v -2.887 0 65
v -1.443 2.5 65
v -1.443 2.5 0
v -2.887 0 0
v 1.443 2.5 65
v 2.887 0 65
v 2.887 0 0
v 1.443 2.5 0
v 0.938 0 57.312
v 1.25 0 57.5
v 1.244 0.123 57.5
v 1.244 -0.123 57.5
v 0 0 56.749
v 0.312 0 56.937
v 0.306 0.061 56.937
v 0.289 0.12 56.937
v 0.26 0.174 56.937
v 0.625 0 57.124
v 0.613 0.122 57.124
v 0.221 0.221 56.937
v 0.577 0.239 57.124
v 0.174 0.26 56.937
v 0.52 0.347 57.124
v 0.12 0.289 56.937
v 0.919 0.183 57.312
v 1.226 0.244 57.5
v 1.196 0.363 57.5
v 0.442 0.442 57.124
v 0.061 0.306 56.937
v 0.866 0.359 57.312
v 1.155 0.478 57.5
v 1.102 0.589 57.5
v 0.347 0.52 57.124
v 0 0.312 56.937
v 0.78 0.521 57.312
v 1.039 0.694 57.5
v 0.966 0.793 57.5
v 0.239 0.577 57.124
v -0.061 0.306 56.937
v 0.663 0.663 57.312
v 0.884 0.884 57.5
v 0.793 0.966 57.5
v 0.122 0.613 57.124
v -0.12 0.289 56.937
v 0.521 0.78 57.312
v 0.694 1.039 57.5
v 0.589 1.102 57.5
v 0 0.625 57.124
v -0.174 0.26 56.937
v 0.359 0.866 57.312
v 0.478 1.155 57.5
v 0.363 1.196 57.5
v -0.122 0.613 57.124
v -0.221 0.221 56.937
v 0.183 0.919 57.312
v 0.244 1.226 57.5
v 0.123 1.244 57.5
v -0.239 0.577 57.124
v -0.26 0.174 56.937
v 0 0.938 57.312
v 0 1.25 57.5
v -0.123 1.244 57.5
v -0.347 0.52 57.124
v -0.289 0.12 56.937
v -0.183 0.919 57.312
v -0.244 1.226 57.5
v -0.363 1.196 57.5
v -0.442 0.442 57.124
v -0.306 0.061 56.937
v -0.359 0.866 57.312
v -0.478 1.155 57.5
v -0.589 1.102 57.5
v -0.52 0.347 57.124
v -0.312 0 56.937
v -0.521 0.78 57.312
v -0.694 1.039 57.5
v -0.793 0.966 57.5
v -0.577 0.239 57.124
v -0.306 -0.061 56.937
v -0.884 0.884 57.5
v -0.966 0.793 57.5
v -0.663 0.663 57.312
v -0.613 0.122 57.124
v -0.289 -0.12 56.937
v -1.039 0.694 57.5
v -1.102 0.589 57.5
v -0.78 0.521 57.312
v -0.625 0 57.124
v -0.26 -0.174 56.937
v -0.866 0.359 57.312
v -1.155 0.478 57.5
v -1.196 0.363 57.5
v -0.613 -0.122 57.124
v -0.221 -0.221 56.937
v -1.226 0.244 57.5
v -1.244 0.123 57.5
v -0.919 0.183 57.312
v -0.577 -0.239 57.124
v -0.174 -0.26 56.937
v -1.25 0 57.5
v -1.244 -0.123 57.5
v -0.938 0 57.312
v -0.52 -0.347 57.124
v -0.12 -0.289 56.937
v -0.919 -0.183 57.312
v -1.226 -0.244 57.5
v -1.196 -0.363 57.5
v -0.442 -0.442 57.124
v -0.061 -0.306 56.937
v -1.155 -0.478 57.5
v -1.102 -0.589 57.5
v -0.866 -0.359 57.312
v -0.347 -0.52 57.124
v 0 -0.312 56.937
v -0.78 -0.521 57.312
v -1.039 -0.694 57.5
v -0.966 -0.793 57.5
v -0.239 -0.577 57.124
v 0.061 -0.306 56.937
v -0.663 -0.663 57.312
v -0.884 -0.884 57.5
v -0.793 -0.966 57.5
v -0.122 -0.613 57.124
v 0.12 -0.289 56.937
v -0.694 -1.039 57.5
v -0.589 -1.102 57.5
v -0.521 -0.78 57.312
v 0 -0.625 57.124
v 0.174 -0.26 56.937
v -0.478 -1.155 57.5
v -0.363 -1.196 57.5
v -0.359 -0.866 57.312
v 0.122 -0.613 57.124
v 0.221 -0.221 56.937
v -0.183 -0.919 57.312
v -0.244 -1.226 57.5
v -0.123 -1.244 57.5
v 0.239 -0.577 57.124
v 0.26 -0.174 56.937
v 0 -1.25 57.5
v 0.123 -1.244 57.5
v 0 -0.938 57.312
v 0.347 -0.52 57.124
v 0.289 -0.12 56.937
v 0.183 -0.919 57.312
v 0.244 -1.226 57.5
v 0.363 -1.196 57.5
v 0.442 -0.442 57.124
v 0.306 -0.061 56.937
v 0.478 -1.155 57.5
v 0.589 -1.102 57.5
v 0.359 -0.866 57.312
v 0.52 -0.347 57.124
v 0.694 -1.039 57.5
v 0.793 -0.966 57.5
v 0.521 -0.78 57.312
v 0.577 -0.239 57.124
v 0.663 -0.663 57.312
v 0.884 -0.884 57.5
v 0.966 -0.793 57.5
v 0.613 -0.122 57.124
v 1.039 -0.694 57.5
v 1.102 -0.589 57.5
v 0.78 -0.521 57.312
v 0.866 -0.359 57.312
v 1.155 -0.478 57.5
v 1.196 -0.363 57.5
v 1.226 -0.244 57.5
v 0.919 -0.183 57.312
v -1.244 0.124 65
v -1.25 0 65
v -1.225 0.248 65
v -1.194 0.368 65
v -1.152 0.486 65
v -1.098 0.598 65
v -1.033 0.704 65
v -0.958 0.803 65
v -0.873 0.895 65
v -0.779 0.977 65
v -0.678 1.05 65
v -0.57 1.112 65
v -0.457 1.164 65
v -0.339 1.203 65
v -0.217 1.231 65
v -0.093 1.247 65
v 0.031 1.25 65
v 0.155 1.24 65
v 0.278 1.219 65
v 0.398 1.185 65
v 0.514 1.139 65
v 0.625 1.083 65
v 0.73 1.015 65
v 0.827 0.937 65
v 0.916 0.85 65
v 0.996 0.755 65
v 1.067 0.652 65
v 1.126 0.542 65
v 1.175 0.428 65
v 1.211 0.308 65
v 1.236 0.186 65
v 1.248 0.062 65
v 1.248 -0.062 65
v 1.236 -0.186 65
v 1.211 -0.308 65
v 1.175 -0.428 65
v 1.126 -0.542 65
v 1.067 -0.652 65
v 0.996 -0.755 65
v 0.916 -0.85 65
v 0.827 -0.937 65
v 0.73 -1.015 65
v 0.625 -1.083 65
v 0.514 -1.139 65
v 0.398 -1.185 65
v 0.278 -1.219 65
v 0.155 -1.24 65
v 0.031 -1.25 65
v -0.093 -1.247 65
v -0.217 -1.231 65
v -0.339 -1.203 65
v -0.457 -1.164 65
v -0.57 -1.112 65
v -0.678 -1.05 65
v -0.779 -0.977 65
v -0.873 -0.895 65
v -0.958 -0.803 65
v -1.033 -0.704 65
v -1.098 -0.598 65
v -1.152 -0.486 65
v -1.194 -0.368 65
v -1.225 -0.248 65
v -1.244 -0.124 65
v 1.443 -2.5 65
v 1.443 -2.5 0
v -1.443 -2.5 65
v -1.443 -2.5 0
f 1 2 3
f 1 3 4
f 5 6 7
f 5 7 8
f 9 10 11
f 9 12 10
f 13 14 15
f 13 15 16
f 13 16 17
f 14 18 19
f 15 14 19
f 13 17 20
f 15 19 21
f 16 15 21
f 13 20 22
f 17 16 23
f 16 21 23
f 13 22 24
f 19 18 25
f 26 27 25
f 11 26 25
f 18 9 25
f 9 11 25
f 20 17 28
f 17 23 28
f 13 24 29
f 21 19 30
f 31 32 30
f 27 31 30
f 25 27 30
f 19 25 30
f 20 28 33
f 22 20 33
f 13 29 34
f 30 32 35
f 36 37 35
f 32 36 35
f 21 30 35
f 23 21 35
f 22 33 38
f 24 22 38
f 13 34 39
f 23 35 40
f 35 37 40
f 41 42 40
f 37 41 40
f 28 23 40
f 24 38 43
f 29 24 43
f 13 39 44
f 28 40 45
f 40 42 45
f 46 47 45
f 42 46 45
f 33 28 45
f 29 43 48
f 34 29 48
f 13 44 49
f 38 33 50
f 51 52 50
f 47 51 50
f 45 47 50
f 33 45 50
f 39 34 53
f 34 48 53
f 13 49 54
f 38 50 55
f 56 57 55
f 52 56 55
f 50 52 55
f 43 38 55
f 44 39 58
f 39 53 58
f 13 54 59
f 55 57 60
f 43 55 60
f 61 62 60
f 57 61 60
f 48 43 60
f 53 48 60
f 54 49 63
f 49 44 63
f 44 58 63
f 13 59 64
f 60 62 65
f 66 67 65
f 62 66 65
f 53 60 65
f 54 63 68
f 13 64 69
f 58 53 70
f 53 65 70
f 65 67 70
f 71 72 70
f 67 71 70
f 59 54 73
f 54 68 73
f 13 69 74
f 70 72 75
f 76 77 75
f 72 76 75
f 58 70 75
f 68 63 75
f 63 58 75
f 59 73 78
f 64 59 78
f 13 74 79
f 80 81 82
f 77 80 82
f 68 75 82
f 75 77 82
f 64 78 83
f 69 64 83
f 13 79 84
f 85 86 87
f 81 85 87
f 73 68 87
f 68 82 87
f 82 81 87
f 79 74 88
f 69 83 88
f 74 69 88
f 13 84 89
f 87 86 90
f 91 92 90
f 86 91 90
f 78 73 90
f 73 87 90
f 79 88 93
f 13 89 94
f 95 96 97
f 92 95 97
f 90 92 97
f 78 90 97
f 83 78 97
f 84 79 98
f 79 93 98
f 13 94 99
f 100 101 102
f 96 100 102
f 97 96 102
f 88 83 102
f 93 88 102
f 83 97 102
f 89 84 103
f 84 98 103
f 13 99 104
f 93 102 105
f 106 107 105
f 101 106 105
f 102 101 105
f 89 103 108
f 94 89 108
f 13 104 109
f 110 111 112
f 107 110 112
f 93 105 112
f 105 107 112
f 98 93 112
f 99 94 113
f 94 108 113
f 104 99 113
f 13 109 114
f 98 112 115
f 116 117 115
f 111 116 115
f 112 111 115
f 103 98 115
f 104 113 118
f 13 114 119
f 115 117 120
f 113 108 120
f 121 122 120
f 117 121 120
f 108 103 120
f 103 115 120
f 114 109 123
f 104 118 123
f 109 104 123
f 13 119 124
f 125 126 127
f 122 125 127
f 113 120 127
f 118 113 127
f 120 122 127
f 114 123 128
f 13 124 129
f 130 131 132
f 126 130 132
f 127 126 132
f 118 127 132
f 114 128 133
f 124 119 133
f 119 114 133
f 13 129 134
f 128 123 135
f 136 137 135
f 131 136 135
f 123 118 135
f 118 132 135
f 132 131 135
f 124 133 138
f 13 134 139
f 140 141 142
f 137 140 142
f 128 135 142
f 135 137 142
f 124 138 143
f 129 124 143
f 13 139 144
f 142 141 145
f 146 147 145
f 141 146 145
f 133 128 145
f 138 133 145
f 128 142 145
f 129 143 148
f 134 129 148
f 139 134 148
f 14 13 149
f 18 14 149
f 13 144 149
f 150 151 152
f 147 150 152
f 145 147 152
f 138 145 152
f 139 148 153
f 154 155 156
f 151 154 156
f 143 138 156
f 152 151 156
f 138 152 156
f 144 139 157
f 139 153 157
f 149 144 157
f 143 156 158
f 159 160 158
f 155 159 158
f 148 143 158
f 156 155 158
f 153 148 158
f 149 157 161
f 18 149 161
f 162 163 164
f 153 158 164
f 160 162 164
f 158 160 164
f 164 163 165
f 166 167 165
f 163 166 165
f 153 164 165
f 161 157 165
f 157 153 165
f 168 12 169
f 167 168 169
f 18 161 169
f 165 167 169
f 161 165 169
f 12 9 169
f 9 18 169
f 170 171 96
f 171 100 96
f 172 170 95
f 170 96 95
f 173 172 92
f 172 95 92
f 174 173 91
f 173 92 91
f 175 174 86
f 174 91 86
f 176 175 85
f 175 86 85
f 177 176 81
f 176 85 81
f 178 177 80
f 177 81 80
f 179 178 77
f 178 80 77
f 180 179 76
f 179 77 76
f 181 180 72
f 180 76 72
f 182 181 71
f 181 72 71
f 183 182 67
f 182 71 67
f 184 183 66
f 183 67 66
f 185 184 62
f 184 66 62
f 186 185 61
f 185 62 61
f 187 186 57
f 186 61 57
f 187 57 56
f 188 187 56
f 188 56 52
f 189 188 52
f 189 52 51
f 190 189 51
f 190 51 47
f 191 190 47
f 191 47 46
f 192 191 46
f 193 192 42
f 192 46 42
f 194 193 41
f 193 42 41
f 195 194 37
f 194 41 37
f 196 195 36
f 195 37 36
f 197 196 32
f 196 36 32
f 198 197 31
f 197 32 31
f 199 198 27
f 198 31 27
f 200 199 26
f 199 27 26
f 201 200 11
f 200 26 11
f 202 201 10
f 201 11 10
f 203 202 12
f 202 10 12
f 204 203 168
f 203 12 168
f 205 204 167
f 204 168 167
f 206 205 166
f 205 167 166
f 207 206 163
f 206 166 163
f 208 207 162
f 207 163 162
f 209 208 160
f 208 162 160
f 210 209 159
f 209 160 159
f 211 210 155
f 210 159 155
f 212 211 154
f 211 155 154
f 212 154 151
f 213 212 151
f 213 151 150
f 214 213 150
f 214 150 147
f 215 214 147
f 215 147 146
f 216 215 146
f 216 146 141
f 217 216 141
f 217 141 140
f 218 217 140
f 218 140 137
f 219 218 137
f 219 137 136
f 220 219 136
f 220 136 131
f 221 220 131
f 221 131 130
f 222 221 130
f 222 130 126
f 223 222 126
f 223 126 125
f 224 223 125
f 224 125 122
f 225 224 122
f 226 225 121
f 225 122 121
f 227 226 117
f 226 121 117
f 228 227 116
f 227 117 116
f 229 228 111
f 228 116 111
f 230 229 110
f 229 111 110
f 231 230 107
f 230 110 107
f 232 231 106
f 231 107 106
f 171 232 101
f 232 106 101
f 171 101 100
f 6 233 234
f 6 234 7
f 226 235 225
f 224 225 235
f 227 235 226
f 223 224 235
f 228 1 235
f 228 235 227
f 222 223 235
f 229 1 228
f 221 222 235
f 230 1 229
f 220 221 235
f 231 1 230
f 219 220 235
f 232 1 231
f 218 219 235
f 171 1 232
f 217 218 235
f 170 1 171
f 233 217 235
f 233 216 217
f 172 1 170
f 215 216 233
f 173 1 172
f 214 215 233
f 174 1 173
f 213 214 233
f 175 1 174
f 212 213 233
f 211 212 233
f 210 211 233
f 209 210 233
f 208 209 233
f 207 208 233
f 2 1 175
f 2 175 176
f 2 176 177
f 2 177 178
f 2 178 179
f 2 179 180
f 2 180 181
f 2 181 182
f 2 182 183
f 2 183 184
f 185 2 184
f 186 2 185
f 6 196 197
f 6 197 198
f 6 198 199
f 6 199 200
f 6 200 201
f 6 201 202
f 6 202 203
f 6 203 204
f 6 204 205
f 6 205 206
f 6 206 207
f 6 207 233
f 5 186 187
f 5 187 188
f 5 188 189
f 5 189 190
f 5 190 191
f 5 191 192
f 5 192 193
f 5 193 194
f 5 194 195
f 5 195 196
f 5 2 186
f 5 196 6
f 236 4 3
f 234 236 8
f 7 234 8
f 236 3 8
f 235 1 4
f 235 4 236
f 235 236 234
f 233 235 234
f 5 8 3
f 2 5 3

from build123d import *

# Parameters (mm, degrees)
SKETCH_1_R             = 1.5
EXTRUDE_1_DEPTH        = 65
HOLE_WIZARD_M3_1_D     = 2.5
HOLE_WIZARD_M3_1_DEPTH = 7.5
HOLE_WIZARD_M3_1_TIP   = 0.751075774


with BuildPart() as part:
    # 草图1 → 凸台-拉伸1 (new body)
    # profile 1 of 2: a face of its own
    with BuildSketch(Plane.XY):
        Polygon((-1.443375673, -2.5), (1.443375673, -2.5), (2.886751346, 0), (1.443375673, 2.5), (-1.443375673, 2.5), (-2.886751346, 0), align=None)
        Circle(SKETCH_1_R, mode=Mode.SUBTRACT)
    # profile 2 of 2: a face of its own
    with BuildSketch(Plane.XY):
        Circle(SKETCH_1_R)
    extrude(amount=EXTRUDE_1_DEPTH)

    # M3 螺纹孔1
    with Locations(Plane.XY.offset(65)):
        with Locations((0, 0)):
            Hole(HOLE_WIZARD_M3_1_D / 2, depth=HOLE_WIZARD_M3_1_DEPTH)
            with Locations((0, 0, -(HOLE_WIZARD_M3_1_DEPTH + HOLE_WIZARD_M3_1_TIP / 2))):  # 118° drill point
                Cone(0, HOLE_WIZARD_M3_1_D / 2, HOLE_WIZARD_M3_1_TIP, mode=Mode.SUBTRACT)


solid = part.part
